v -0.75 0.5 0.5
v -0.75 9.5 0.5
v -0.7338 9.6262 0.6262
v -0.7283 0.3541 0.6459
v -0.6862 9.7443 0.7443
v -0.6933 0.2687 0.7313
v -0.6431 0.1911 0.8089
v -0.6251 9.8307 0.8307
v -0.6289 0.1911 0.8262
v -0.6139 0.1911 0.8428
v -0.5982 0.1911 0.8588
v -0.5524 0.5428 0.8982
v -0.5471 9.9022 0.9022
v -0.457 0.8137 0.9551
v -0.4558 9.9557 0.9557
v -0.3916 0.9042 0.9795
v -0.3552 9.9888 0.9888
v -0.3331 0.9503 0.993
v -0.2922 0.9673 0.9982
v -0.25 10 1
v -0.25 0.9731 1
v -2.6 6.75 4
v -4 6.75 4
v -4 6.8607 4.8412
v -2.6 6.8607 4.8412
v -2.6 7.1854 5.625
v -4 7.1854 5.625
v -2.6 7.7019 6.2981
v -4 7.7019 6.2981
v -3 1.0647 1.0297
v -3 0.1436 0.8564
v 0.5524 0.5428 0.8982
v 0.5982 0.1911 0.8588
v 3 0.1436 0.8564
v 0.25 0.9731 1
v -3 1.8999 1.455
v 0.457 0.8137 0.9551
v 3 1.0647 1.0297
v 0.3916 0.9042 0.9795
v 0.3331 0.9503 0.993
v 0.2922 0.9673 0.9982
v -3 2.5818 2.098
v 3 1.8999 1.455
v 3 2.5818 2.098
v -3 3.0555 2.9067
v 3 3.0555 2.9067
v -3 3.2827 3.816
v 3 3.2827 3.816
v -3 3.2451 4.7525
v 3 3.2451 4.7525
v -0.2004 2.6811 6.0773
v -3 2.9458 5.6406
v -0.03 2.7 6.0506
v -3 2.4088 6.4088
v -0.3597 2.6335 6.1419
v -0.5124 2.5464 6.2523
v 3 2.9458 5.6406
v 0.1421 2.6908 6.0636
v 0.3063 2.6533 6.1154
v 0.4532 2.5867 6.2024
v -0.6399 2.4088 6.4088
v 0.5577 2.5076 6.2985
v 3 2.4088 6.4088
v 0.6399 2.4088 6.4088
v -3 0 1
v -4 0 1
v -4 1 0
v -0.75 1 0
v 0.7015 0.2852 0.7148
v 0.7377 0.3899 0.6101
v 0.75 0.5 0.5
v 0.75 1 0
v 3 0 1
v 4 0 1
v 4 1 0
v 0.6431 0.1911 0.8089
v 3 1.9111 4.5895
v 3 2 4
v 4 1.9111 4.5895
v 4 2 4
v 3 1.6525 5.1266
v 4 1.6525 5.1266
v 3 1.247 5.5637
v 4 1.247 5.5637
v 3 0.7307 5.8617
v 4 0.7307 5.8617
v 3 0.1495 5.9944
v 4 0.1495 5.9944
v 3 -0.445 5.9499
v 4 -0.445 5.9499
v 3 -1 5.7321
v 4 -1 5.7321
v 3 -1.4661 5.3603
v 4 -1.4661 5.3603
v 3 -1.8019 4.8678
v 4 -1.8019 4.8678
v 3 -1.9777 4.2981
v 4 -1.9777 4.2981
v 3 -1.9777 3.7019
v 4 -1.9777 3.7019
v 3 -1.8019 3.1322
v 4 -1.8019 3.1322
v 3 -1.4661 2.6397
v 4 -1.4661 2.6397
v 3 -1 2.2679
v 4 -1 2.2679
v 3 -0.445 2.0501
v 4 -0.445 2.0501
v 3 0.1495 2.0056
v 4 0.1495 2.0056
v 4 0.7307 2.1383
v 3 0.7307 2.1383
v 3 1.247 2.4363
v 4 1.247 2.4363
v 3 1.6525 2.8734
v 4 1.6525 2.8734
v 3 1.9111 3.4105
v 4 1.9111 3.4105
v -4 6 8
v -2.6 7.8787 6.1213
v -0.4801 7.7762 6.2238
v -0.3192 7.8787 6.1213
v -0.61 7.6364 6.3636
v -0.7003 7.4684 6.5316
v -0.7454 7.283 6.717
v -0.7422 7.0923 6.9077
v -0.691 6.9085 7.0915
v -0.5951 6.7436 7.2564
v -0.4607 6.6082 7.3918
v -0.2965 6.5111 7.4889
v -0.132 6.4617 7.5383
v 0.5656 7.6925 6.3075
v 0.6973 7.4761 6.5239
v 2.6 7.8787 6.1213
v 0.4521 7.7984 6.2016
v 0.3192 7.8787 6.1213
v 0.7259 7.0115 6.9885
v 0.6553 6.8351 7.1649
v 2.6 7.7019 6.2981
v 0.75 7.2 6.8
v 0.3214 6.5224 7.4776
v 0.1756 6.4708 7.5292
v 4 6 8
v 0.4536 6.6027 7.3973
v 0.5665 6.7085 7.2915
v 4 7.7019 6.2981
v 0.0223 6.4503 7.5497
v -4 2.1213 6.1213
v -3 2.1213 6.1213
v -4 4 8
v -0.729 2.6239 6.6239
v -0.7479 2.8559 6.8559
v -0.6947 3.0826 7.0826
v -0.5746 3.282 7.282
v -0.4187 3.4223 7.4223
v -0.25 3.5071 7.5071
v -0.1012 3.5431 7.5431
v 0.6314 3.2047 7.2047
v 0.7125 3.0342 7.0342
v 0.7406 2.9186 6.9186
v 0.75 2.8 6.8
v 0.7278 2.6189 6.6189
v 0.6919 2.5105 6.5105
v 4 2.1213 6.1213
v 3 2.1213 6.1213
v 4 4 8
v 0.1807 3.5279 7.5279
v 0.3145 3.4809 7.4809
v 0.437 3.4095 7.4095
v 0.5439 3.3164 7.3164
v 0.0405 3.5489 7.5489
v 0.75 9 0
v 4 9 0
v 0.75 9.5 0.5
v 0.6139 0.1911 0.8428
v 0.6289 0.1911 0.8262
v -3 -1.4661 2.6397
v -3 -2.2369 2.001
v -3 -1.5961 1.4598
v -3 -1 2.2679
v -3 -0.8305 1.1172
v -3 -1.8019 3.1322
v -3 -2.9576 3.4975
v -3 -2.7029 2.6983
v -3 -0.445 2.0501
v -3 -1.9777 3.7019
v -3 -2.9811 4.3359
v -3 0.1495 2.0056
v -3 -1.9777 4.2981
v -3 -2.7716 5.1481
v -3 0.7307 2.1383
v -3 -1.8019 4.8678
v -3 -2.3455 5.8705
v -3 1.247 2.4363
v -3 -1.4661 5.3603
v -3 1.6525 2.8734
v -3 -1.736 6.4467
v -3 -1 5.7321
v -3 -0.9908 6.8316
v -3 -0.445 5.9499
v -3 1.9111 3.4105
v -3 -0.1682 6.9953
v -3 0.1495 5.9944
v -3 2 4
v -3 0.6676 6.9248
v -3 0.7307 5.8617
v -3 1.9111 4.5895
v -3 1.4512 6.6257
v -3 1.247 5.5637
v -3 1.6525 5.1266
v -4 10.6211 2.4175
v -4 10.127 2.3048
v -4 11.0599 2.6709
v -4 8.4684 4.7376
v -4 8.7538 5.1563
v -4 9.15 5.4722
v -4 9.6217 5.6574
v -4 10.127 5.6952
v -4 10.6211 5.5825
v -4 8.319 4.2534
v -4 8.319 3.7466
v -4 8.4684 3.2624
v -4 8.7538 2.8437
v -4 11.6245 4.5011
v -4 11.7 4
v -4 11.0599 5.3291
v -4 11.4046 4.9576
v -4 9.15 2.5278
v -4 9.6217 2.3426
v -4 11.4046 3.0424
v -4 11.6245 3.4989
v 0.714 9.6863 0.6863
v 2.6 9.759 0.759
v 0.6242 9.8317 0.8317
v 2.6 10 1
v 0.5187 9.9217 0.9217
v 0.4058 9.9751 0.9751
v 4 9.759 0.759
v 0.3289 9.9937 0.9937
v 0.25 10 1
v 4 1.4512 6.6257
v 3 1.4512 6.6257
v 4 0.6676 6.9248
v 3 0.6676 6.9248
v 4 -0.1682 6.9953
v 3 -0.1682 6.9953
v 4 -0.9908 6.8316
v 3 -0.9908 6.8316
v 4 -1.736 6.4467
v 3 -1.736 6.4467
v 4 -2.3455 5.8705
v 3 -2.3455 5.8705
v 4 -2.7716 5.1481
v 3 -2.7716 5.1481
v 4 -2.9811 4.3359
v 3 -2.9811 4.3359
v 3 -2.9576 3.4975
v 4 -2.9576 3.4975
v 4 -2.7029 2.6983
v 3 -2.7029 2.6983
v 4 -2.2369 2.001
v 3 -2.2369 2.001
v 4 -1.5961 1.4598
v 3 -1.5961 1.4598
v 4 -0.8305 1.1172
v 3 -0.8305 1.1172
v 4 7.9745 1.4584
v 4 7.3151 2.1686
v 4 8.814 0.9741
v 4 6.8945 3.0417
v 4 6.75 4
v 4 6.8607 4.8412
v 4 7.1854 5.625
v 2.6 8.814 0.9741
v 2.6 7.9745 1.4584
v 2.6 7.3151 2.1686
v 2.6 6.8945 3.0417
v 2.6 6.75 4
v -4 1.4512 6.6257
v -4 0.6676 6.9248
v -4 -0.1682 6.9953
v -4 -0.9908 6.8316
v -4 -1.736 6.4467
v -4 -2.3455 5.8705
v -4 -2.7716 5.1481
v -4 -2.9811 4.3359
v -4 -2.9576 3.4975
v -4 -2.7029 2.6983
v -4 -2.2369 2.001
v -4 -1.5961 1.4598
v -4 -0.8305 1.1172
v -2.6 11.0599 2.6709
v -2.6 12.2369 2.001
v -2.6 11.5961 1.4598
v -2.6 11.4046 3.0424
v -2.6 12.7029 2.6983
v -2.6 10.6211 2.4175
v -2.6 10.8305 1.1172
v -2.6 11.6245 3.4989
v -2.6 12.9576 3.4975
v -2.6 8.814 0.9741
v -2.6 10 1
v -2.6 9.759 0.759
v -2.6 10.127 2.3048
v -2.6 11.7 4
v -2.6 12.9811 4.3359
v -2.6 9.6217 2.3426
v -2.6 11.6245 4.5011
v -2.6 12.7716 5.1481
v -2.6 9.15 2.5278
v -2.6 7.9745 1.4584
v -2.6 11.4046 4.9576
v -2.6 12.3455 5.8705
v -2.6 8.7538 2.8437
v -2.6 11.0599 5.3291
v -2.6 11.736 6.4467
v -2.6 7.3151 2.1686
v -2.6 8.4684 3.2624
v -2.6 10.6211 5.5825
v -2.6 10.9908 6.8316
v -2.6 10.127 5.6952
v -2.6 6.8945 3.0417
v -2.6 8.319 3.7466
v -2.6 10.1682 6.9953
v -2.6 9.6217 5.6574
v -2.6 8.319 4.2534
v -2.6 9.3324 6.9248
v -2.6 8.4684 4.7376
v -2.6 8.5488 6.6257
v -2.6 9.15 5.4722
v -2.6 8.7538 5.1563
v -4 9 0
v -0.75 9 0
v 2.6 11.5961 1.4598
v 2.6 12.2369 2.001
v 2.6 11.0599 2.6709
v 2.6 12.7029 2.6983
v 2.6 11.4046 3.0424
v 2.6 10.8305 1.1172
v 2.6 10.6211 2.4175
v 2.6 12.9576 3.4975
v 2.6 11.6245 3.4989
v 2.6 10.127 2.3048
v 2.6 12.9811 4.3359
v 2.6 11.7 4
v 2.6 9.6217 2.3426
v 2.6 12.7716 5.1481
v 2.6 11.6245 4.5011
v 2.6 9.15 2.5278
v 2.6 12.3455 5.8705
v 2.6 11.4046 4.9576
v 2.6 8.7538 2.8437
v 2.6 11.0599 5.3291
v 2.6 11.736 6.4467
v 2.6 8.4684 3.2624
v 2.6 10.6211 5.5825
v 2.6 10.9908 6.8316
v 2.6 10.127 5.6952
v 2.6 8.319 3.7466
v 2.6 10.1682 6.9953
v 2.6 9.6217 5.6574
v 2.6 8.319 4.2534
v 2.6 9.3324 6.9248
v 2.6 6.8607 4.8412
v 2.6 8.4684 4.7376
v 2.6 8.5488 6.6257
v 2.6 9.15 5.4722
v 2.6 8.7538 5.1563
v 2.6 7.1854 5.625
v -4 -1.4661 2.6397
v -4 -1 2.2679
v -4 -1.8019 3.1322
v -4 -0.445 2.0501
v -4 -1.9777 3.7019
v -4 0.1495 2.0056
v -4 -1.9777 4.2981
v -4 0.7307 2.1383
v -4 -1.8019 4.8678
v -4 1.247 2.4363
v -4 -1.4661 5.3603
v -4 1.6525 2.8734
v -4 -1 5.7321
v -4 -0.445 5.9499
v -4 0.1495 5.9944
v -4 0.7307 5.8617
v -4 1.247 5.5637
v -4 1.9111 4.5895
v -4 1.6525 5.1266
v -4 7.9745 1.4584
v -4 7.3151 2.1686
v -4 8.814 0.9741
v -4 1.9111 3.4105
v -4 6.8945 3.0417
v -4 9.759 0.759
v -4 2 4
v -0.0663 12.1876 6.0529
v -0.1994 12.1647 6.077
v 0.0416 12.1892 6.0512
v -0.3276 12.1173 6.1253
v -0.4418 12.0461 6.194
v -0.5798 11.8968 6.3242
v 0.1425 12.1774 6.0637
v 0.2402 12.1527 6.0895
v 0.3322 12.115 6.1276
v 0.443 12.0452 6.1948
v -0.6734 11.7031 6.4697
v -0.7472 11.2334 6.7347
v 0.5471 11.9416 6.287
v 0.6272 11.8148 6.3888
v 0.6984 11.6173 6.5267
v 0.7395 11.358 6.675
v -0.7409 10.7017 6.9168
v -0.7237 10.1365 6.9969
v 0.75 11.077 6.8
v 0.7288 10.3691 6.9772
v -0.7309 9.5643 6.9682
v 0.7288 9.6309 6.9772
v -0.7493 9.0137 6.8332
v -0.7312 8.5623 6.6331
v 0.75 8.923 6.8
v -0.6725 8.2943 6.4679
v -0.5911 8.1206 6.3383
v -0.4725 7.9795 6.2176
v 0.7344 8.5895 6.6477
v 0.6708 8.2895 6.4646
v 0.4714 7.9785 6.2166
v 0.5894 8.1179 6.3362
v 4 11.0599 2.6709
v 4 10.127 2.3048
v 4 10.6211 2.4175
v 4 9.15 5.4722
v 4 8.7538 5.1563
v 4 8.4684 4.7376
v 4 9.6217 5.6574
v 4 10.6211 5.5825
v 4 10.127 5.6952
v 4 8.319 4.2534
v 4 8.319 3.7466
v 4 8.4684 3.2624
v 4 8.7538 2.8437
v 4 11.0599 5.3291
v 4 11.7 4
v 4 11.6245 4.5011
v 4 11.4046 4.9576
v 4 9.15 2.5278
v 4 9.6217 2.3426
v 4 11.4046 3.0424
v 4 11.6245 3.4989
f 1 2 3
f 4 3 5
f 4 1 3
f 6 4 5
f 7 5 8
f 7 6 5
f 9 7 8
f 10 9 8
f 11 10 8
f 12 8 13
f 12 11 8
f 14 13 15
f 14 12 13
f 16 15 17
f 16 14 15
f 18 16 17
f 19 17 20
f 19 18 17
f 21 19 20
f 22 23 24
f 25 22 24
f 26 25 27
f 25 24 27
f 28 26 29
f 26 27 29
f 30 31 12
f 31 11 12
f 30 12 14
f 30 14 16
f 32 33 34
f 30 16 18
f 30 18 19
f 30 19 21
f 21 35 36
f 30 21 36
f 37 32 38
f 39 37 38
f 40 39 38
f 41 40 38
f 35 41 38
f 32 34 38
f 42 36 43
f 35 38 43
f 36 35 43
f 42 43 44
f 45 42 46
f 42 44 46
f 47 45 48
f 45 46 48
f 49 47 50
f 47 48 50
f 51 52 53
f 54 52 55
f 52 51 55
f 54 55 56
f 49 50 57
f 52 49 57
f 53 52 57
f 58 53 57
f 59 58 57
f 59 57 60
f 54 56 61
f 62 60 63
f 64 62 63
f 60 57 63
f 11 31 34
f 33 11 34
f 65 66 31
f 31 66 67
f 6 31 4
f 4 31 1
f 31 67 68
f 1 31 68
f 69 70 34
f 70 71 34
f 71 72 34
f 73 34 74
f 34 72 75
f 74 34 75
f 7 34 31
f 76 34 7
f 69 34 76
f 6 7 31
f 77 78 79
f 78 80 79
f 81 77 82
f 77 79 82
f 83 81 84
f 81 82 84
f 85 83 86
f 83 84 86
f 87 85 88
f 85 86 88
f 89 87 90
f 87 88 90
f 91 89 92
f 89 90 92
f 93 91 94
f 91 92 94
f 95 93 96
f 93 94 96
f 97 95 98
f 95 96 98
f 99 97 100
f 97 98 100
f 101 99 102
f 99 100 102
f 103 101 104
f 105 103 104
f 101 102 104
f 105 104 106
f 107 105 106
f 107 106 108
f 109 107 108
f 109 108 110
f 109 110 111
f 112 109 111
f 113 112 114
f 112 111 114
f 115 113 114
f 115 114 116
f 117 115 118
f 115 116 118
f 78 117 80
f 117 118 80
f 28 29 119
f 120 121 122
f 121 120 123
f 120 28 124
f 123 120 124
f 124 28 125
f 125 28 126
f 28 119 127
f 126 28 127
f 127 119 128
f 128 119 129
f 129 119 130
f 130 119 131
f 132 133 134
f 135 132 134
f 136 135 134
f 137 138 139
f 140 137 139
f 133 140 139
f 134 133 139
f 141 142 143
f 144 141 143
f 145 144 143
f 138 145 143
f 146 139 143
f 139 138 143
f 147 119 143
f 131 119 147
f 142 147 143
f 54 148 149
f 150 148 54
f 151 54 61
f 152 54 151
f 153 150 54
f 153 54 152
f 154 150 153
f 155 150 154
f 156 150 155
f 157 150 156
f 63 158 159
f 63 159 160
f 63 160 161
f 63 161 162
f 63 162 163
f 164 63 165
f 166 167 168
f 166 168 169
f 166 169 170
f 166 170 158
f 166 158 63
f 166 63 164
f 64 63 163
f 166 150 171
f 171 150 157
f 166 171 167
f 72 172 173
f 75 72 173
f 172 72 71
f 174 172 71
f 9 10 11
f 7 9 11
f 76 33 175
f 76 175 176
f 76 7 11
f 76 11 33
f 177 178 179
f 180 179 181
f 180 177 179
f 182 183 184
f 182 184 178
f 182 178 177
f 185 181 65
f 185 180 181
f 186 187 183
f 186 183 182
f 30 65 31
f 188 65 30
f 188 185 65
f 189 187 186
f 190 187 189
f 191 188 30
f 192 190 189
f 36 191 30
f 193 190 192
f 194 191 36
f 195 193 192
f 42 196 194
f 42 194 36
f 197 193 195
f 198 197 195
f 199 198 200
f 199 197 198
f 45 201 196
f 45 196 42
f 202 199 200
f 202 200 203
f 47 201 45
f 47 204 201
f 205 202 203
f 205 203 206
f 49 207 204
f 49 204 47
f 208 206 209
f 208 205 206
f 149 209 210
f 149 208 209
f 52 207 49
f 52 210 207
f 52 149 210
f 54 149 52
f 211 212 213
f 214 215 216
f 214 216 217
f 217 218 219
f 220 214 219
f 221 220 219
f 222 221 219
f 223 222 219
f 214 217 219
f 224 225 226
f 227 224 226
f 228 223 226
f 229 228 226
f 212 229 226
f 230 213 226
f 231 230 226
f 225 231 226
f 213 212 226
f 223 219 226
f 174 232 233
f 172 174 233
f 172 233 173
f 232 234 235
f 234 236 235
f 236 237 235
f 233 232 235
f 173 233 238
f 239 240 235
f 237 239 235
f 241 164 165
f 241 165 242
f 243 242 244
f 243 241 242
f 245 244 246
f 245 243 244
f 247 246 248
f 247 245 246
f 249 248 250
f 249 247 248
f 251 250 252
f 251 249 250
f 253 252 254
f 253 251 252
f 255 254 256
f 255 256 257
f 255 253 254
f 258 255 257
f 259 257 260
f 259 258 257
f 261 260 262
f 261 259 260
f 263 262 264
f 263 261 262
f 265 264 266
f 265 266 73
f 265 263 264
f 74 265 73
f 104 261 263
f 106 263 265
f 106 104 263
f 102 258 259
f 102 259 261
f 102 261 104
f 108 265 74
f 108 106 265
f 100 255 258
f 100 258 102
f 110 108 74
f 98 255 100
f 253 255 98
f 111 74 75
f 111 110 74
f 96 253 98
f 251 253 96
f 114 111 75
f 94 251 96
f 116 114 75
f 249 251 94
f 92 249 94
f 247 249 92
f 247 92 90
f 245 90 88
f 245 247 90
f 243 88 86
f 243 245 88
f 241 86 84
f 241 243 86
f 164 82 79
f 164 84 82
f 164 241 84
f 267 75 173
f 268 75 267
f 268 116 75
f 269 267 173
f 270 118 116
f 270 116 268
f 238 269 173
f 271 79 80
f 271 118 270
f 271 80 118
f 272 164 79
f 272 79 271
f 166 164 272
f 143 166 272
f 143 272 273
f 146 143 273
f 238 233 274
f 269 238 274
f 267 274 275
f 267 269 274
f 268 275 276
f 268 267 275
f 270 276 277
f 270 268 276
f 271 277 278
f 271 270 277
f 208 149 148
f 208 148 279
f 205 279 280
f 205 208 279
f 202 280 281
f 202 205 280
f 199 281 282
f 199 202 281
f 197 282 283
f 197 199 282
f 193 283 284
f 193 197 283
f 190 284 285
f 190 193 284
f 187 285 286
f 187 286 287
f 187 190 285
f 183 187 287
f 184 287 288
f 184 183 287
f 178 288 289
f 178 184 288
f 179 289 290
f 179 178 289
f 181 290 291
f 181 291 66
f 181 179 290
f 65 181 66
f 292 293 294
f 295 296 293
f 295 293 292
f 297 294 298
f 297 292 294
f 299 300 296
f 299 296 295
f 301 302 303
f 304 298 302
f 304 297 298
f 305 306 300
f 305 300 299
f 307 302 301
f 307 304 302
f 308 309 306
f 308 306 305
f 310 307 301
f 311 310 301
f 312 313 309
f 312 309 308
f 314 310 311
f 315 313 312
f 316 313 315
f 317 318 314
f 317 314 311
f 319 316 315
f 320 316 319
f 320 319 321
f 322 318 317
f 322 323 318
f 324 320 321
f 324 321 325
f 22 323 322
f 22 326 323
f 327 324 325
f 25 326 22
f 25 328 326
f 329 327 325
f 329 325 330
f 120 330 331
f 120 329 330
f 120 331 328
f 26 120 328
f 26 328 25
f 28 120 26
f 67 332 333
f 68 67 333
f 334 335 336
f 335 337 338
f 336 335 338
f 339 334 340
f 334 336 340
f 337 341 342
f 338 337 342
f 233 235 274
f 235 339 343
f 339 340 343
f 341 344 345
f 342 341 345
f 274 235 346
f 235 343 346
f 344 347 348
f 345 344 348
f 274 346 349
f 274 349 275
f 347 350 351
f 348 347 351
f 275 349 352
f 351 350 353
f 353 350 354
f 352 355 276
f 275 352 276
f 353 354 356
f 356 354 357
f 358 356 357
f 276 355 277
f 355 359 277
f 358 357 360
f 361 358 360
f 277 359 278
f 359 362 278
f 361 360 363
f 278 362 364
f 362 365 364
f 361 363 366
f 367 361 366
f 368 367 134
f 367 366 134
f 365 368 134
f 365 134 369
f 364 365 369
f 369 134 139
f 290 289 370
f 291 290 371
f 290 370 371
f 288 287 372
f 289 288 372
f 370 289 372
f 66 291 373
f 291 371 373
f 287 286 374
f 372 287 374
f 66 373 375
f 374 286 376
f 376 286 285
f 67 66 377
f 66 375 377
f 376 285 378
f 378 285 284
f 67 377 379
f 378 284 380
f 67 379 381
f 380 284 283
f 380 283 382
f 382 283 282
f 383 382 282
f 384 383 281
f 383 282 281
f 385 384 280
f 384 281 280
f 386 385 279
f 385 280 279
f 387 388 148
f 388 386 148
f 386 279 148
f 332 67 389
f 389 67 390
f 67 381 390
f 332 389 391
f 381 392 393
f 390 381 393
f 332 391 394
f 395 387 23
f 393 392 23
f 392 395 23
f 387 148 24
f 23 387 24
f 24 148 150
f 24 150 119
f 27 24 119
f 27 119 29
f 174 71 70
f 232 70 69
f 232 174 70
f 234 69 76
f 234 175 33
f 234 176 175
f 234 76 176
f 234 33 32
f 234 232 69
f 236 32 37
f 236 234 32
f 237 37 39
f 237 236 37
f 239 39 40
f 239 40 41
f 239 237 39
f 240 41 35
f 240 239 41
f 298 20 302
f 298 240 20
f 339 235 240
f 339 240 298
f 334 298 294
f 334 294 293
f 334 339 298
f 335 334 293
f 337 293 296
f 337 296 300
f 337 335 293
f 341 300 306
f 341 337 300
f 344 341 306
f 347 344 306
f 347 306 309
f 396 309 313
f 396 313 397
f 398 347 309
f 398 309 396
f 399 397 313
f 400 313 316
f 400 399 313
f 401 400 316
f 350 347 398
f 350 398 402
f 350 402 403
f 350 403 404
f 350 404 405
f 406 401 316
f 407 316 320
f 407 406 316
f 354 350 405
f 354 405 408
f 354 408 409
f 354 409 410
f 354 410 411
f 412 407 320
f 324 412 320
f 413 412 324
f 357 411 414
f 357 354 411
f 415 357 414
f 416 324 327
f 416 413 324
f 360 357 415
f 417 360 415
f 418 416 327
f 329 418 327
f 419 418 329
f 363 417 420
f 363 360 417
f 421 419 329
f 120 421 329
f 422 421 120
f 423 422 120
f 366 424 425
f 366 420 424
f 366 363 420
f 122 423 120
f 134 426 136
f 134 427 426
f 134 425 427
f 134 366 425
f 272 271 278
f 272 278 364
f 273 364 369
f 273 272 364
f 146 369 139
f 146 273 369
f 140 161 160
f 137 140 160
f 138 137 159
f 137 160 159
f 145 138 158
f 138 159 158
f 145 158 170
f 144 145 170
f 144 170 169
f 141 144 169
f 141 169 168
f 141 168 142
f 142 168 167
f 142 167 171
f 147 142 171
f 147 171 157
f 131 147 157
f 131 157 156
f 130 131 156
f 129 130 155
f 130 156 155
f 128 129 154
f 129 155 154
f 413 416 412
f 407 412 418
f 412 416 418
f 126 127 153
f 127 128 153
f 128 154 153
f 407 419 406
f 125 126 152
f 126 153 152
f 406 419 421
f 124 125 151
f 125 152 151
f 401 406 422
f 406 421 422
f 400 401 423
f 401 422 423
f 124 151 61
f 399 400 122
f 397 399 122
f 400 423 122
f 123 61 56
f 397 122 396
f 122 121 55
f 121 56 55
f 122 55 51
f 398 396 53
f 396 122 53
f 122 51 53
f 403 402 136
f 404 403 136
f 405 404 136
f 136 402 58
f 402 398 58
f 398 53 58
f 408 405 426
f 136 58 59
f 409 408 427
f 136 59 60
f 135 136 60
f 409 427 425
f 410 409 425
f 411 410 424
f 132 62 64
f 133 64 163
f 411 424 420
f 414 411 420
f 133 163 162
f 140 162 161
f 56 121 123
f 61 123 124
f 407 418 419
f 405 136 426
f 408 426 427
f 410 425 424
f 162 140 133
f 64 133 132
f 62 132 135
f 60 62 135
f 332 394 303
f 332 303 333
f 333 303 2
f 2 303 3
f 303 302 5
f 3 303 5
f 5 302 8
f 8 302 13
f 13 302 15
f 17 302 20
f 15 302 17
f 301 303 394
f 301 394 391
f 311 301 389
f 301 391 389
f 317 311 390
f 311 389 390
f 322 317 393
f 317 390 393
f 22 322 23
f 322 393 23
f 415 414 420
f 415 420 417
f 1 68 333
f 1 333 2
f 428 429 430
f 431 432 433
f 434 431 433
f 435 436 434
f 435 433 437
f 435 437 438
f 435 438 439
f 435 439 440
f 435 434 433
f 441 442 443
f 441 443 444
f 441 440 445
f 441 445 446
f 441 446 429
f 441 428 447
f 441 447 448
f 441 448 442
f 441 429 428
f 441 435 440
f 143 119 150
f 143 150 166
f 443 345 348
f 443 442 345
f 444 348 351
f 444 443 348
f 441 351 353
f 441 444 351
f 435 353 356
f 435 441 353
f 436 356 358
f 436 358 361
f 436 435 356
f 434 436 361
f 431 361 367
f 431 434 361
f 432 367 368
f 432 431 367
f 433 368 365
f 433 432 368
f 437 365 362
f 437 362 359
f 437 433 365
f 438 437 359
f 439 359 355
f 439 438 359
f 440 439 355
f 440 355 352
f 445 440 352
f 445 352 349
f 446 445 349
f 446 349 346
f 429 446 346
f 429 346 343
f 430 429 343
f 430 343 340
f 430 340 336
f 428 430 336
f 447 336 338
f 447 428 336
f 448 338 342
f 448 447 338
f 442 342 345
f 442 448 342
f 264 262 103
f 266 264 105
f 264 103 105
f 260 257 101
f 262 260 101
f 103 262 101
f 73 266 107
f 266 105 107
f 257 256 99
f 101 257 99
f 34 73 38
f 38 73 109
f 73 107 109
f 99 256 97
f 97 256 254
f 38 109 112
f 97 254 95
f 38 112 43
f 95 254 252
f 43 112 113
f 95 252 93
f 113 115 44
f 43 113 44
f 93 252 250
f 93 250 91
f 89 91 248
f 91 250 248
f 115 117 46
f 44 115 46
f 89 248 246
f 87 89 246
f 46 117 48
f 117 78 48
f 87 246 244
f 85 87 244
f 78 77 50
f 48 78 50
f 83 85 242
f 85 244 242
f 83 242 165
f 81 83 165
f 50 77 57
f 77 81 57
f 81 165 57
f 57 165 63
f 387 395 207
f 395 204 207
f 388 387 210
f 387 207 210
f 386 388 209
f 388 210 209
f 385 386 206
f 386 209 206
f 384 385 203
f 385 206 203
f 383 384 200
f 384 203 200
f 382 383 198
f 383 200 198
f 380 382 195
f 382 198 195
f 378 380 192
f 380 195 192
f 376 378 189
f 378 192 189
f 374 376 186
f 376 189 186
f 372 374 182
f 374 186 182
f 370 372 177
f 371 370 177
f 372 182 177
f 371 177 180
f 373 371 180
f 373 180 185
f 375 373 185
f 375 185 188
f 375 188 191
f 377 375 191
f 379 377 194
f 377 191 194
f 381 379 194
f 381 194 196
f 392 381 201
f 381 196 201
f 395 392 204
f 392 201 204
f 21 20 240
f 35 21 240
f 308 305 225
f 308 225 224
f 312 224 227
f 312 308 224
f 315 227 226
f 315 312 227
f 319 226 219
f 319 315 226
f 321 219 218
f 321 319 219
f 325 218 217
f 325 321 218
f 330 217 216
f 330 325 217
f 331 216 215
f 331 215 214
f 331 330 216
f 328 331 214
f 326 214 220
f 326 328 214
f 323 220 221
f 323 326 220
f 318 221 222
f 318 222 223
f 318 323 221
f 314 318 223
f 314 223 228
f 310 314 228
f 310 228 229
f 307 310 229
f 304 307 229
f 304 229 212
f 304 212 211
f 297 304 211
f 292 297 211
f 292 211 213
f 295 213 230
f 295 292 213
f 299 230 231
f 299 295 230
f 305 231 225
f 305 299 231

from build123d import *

# Parameters (mm, degrees)
F0_W          = 8
F0_H          = 10
F1_DEPTH      = 8
F2_SIZE       = 4
F4_DEPTH      = 4
F5_DEPTH      = 3
F6_R          = 3.3
F7_DEPTH      = 3
F9_DEPTH      = 1.4
F11_R         = 1.7
F12_DEPTH     = 4
F13_R         = 2
F14_DEPTH     = 12.5
F15_T1_DEPTH  = 13.1433659759
F15_T6_DEPTH  = 13.1433659759
F15_S7_R      = 3
F15_T8_DEPTH  = 8
F16_W         = 1.5
F16_H         = 1.0667801354
F16_H_2       = 8
F16_H_3       = 0.8089432385
F17_DEPTH     = 1
F18_T4_DEPTH  = 11.5268513298
F18_S7_R      = 3.3
F18_T8_DEPTH  = 7
F18_T12_DEPTH = 11.5268513298
F18_S14_R     = 3.3
F18_T15_DEPTH = 7
F19_R         = 0.75
F20_DEPTH     = 25


# Not quite as in the source:
# - a fillet or chamfer that OpenCascade refuses, or shapes differently, is made with other operations: its cross-section is extruded or revolved along the edge and cut away or added


with BuildPart() as f1:
    # F0 (on Top) → F1 (new body)
    with BuildSketch(Plane.XY):
        with Locations((0, 5)):
            Rectangle(F0_W, F0_H)
    extrude(amount=F1_DEPTH)

    # F2
    f2_edges = [f1.edges().sort_by_distance(p)[0] for p in [
        (0, 0, 8),
        (0, 10, 8),
    ]]
    chamfer(f2_edges, length=F2_SIZE)

    # F3 (on Right) → F4 (join, symmetric)
    with BuildSketch(Plane.YZ):
        with BuildLine():
            ThreePointArc((2.1213203436, 6.1213203436), (-2.7716385975, 5.1480502971), (0, 1))
            Line((0, 1), (0, 4))
            Line((0, 4), (2.1213203436, 6.1213203436))
        make_face()
    extrude(amount=F4_DEPTH, both=True)

    # F3 (on Right) → F5 (join, symmetric)
    with BuildSketch(Plane.YZ):
        with BuildLine():
            Line((10, 4), (10, 1))
            ThreePointArc((10, 1), (12.1213203436, 1.8786796564), (13, 4))
            ThreePointArc((13, 4), (11.1480502971, 6.7716385975), (7.8786796564, 6.1213203436))
            Line((7.8786796564, 6.1213203436), (10, 4))
        make_face()
    extrude(amount=F5_DEPTH, both=True)

    # F6 (on Right) → F7 (cut, symmetric)
    with BuildSketch(Plane.YZ):
        with Locations((0, 4.1532493821)):
            Circle(F6_R)
    extrude(amount=F7_DEPTH, both=True, mode=Mode.SUBTRACT)

    # F8 (on face) → F9 (cut)
    with BuildSketch(Plane(origin=(-4, 0, 0), x_dir=(0, -1, 0), z_dir=(-1, 0, 0))):
        with BuildLine():
            Line((-10, 4), (-7.7019029611, 6.2980970389))
            ThreePointArc((-7.7019029611, 6.2980970389), (-13.0026084807, 5.2437211552), (-10, 0.75))
            Line((-10, 0.75), (-10, 4))
        make_face()
        with BuildLine():
            ThreePointArc((-10, 0.75), (-7.7019029611, 1.7019029611), (-6.75, 4))
            ThreePointArc((-6.75, 4), (-6.9973915193, 5.2437211552), (-7.7019029611, 6.2980970389))
            Line((-7.7019029611, 6.2980970389), (-10, 4))
            Line((-10, 4), (-10, 0.75))
        make_face()
    extrude(amount=-F9_DEPTH, mode=Mode.SUBTRACT)

    # F10: F1 across plane


with BuildPart() as f1_1:
    add(f1.part)
    add(f1.part.mirror(Plane.YZ), mode=Mode.INTERSECT)

    # F11 (on Right) → F12 (join, symmetric)
    with BuildSketch(Plane.YZ):
        with Locations((10, 4)):
            Circle(F11_R)
    extrude(amount=F12_DEPTH, both=True)

    # F13 (on Right) → F14 (cut, symmetric)
    with BuildSketch(Plane.YZ):
        with Locations((0, 4)):
            Circle(F13_R)
    extrude(amount=F14_DEPTH, both=True, mode=Mode.SUBTRACT)

    # F15: chamfer of 1 on 2 edges, made by hand

    # F15_s2 → F15_t1 (cut)
    with BuildSketch(Plane.YZ.offset(-6.571682988)):
        Polygon((1, 0), (0, 1), (0, 0), align=None)
    extrude(amount=F15_T1_DEPTH, mode=Mode.SUBTRACT)


with BuildPart() as f15_tool4:
    # F15_s5 → F15_t6 (new body)
    with BuildSketch(Plane.YZ.offset(6.571682988)):
        Polygon((9, 0), (10, 1), (10, 0), align=None)
    extrude(amount=-F15_T6_DEPTH)

    # F15_s7 → F15_t8 (cut, symmetric)
    with BuildSketch(Plane.YZ):
        with Locations((10, 4)):
            Circle(F15_S7_R)
    extrude(amount=F15_T8_DEPTH, both=True, mode=Mode.SUBTRACT)


with BuildPart() as f1_2:
    add(f1_1.part)

    # F15_t3: cut F15_tool4
    add(f15_tool4.part, mode=Mode.SUBTRACT)

    # F16 (on face) → F17 (cut)
    with BuildSketch(Plane(origin=(0, 0, 0), x_dir=(1, 0, 0), z_dir=(0, 0, -1))):
        with Locations((0, -9.5333900677)):
            Rectangle(F16_W, F16_H)
        with Locations((0, -5)):
            Rectangle(F16_W, F16_H_2)
        with Locations((0, -0.5955283808)):
            Rectangle(F16_W, F16_H_3)
    extrude(amount=-F17_DEPTH, mode=Mode.SUBTRACT)

    # F18: fillet of radius 0.5 on 2 edges, made by hand


with BuildPart() as f18_tool2:
    # F18_s3 → F18_t4 (new body)
    with BuildSketch(Plane.XZ.offset(0.2768513298)):
        with BuildLine():
            ThreePointArc((-0.75, 0.5), (-0.6035533906, 0.8535533906), (-0.25, 1))
            Line((-0.25, 1), (-0.75, 1))
            Line((-0.75, 1), (-0.75, 0.5))
        make_face()
    extrude(amount=-F18_T4_DEPTH)

    split(bisect_by=Plane(origin=(0, 0.5, 0.5), x_dir=(1, 0, 0), z_dir=(0, 0.7071067812, 0.7071067812)), keep=Keep.TOP)

    split(bisect_by=Plane(origin=(0, 4.5, -4.5), x_dir=(1, 0, 0), z_dir=(0, -0.7071067812, 0.7071067812)), keep=Keep.TOP)

    # F18_s7 → F18_t8 (cut, symmetric)
    with BuildSketch(Plane.YZ.offset(-0.5)):
        with Locations((0, 4.1532493821)):
            Circle(F18_S7_R)
    extrude(amount=F18_T8_DEPTH, both=True, mode=Mode.SUBTRACT)


with BuildPart() as f1_3:
    add(f1_2.part)

    # F18_t1: union F18_tool2
    add(f18_tool2.part)


with BuildPart() as f18_tool10:
    # F18_s11 → F18_t12 (new body)
    with BuildSketch(Plane.XZ.offset(-11.25)):
        with BuildLine():
            ThreePointArc((0.75, 0.5), (0.6035533906, 0.8535533906), (0.25, 1))
            Line((0.25, 1), (0.75, 1))
            Line((0.75, 1), (0.75, 0.5))
        make_face()
    extrude(amount=F18_T12_DEPTH)

    split(bisect_by=Plane(origin=(0, 0.5, 0.5), x_dir=(1, 0, 0), z_dir=(0, 0.7071067812, 0.7071067812)), keep=Keep.TOP)

    # F18_s14 → F18_t15 (cut, symmetric)
    with BuildSketch(Plane.YZ.offset(0.5)):
        with Locations((0, 4.1532493821)):
            Circle(F18_S14_R)
    extrude(amount=F18_T15_DEPTH, both=True, mode=Mode.SUBTRACT)

    split(bisect_by=Plane(origin=(0, 4.5, -4.5), x_dir=(1, 0, 0), z_dir=(0, -0.7071067812, 0.7071067812)), keep=Keep.TOP)


with BuildPart() as f1_4:
    add(f1_3.part)

    # F18_t9: union F18_tool10
    add(f18_tool10.part)

    # F19 (on Front) → F20 (cut)
    with BuildSketch(Plane.XZ):
        with Locations((0, 6.8)):
            Circle(F19_R)
    extrude(amount=-F20_DEPTH, mode=Mode.SUBTRACT)


solid = f1_4.part
